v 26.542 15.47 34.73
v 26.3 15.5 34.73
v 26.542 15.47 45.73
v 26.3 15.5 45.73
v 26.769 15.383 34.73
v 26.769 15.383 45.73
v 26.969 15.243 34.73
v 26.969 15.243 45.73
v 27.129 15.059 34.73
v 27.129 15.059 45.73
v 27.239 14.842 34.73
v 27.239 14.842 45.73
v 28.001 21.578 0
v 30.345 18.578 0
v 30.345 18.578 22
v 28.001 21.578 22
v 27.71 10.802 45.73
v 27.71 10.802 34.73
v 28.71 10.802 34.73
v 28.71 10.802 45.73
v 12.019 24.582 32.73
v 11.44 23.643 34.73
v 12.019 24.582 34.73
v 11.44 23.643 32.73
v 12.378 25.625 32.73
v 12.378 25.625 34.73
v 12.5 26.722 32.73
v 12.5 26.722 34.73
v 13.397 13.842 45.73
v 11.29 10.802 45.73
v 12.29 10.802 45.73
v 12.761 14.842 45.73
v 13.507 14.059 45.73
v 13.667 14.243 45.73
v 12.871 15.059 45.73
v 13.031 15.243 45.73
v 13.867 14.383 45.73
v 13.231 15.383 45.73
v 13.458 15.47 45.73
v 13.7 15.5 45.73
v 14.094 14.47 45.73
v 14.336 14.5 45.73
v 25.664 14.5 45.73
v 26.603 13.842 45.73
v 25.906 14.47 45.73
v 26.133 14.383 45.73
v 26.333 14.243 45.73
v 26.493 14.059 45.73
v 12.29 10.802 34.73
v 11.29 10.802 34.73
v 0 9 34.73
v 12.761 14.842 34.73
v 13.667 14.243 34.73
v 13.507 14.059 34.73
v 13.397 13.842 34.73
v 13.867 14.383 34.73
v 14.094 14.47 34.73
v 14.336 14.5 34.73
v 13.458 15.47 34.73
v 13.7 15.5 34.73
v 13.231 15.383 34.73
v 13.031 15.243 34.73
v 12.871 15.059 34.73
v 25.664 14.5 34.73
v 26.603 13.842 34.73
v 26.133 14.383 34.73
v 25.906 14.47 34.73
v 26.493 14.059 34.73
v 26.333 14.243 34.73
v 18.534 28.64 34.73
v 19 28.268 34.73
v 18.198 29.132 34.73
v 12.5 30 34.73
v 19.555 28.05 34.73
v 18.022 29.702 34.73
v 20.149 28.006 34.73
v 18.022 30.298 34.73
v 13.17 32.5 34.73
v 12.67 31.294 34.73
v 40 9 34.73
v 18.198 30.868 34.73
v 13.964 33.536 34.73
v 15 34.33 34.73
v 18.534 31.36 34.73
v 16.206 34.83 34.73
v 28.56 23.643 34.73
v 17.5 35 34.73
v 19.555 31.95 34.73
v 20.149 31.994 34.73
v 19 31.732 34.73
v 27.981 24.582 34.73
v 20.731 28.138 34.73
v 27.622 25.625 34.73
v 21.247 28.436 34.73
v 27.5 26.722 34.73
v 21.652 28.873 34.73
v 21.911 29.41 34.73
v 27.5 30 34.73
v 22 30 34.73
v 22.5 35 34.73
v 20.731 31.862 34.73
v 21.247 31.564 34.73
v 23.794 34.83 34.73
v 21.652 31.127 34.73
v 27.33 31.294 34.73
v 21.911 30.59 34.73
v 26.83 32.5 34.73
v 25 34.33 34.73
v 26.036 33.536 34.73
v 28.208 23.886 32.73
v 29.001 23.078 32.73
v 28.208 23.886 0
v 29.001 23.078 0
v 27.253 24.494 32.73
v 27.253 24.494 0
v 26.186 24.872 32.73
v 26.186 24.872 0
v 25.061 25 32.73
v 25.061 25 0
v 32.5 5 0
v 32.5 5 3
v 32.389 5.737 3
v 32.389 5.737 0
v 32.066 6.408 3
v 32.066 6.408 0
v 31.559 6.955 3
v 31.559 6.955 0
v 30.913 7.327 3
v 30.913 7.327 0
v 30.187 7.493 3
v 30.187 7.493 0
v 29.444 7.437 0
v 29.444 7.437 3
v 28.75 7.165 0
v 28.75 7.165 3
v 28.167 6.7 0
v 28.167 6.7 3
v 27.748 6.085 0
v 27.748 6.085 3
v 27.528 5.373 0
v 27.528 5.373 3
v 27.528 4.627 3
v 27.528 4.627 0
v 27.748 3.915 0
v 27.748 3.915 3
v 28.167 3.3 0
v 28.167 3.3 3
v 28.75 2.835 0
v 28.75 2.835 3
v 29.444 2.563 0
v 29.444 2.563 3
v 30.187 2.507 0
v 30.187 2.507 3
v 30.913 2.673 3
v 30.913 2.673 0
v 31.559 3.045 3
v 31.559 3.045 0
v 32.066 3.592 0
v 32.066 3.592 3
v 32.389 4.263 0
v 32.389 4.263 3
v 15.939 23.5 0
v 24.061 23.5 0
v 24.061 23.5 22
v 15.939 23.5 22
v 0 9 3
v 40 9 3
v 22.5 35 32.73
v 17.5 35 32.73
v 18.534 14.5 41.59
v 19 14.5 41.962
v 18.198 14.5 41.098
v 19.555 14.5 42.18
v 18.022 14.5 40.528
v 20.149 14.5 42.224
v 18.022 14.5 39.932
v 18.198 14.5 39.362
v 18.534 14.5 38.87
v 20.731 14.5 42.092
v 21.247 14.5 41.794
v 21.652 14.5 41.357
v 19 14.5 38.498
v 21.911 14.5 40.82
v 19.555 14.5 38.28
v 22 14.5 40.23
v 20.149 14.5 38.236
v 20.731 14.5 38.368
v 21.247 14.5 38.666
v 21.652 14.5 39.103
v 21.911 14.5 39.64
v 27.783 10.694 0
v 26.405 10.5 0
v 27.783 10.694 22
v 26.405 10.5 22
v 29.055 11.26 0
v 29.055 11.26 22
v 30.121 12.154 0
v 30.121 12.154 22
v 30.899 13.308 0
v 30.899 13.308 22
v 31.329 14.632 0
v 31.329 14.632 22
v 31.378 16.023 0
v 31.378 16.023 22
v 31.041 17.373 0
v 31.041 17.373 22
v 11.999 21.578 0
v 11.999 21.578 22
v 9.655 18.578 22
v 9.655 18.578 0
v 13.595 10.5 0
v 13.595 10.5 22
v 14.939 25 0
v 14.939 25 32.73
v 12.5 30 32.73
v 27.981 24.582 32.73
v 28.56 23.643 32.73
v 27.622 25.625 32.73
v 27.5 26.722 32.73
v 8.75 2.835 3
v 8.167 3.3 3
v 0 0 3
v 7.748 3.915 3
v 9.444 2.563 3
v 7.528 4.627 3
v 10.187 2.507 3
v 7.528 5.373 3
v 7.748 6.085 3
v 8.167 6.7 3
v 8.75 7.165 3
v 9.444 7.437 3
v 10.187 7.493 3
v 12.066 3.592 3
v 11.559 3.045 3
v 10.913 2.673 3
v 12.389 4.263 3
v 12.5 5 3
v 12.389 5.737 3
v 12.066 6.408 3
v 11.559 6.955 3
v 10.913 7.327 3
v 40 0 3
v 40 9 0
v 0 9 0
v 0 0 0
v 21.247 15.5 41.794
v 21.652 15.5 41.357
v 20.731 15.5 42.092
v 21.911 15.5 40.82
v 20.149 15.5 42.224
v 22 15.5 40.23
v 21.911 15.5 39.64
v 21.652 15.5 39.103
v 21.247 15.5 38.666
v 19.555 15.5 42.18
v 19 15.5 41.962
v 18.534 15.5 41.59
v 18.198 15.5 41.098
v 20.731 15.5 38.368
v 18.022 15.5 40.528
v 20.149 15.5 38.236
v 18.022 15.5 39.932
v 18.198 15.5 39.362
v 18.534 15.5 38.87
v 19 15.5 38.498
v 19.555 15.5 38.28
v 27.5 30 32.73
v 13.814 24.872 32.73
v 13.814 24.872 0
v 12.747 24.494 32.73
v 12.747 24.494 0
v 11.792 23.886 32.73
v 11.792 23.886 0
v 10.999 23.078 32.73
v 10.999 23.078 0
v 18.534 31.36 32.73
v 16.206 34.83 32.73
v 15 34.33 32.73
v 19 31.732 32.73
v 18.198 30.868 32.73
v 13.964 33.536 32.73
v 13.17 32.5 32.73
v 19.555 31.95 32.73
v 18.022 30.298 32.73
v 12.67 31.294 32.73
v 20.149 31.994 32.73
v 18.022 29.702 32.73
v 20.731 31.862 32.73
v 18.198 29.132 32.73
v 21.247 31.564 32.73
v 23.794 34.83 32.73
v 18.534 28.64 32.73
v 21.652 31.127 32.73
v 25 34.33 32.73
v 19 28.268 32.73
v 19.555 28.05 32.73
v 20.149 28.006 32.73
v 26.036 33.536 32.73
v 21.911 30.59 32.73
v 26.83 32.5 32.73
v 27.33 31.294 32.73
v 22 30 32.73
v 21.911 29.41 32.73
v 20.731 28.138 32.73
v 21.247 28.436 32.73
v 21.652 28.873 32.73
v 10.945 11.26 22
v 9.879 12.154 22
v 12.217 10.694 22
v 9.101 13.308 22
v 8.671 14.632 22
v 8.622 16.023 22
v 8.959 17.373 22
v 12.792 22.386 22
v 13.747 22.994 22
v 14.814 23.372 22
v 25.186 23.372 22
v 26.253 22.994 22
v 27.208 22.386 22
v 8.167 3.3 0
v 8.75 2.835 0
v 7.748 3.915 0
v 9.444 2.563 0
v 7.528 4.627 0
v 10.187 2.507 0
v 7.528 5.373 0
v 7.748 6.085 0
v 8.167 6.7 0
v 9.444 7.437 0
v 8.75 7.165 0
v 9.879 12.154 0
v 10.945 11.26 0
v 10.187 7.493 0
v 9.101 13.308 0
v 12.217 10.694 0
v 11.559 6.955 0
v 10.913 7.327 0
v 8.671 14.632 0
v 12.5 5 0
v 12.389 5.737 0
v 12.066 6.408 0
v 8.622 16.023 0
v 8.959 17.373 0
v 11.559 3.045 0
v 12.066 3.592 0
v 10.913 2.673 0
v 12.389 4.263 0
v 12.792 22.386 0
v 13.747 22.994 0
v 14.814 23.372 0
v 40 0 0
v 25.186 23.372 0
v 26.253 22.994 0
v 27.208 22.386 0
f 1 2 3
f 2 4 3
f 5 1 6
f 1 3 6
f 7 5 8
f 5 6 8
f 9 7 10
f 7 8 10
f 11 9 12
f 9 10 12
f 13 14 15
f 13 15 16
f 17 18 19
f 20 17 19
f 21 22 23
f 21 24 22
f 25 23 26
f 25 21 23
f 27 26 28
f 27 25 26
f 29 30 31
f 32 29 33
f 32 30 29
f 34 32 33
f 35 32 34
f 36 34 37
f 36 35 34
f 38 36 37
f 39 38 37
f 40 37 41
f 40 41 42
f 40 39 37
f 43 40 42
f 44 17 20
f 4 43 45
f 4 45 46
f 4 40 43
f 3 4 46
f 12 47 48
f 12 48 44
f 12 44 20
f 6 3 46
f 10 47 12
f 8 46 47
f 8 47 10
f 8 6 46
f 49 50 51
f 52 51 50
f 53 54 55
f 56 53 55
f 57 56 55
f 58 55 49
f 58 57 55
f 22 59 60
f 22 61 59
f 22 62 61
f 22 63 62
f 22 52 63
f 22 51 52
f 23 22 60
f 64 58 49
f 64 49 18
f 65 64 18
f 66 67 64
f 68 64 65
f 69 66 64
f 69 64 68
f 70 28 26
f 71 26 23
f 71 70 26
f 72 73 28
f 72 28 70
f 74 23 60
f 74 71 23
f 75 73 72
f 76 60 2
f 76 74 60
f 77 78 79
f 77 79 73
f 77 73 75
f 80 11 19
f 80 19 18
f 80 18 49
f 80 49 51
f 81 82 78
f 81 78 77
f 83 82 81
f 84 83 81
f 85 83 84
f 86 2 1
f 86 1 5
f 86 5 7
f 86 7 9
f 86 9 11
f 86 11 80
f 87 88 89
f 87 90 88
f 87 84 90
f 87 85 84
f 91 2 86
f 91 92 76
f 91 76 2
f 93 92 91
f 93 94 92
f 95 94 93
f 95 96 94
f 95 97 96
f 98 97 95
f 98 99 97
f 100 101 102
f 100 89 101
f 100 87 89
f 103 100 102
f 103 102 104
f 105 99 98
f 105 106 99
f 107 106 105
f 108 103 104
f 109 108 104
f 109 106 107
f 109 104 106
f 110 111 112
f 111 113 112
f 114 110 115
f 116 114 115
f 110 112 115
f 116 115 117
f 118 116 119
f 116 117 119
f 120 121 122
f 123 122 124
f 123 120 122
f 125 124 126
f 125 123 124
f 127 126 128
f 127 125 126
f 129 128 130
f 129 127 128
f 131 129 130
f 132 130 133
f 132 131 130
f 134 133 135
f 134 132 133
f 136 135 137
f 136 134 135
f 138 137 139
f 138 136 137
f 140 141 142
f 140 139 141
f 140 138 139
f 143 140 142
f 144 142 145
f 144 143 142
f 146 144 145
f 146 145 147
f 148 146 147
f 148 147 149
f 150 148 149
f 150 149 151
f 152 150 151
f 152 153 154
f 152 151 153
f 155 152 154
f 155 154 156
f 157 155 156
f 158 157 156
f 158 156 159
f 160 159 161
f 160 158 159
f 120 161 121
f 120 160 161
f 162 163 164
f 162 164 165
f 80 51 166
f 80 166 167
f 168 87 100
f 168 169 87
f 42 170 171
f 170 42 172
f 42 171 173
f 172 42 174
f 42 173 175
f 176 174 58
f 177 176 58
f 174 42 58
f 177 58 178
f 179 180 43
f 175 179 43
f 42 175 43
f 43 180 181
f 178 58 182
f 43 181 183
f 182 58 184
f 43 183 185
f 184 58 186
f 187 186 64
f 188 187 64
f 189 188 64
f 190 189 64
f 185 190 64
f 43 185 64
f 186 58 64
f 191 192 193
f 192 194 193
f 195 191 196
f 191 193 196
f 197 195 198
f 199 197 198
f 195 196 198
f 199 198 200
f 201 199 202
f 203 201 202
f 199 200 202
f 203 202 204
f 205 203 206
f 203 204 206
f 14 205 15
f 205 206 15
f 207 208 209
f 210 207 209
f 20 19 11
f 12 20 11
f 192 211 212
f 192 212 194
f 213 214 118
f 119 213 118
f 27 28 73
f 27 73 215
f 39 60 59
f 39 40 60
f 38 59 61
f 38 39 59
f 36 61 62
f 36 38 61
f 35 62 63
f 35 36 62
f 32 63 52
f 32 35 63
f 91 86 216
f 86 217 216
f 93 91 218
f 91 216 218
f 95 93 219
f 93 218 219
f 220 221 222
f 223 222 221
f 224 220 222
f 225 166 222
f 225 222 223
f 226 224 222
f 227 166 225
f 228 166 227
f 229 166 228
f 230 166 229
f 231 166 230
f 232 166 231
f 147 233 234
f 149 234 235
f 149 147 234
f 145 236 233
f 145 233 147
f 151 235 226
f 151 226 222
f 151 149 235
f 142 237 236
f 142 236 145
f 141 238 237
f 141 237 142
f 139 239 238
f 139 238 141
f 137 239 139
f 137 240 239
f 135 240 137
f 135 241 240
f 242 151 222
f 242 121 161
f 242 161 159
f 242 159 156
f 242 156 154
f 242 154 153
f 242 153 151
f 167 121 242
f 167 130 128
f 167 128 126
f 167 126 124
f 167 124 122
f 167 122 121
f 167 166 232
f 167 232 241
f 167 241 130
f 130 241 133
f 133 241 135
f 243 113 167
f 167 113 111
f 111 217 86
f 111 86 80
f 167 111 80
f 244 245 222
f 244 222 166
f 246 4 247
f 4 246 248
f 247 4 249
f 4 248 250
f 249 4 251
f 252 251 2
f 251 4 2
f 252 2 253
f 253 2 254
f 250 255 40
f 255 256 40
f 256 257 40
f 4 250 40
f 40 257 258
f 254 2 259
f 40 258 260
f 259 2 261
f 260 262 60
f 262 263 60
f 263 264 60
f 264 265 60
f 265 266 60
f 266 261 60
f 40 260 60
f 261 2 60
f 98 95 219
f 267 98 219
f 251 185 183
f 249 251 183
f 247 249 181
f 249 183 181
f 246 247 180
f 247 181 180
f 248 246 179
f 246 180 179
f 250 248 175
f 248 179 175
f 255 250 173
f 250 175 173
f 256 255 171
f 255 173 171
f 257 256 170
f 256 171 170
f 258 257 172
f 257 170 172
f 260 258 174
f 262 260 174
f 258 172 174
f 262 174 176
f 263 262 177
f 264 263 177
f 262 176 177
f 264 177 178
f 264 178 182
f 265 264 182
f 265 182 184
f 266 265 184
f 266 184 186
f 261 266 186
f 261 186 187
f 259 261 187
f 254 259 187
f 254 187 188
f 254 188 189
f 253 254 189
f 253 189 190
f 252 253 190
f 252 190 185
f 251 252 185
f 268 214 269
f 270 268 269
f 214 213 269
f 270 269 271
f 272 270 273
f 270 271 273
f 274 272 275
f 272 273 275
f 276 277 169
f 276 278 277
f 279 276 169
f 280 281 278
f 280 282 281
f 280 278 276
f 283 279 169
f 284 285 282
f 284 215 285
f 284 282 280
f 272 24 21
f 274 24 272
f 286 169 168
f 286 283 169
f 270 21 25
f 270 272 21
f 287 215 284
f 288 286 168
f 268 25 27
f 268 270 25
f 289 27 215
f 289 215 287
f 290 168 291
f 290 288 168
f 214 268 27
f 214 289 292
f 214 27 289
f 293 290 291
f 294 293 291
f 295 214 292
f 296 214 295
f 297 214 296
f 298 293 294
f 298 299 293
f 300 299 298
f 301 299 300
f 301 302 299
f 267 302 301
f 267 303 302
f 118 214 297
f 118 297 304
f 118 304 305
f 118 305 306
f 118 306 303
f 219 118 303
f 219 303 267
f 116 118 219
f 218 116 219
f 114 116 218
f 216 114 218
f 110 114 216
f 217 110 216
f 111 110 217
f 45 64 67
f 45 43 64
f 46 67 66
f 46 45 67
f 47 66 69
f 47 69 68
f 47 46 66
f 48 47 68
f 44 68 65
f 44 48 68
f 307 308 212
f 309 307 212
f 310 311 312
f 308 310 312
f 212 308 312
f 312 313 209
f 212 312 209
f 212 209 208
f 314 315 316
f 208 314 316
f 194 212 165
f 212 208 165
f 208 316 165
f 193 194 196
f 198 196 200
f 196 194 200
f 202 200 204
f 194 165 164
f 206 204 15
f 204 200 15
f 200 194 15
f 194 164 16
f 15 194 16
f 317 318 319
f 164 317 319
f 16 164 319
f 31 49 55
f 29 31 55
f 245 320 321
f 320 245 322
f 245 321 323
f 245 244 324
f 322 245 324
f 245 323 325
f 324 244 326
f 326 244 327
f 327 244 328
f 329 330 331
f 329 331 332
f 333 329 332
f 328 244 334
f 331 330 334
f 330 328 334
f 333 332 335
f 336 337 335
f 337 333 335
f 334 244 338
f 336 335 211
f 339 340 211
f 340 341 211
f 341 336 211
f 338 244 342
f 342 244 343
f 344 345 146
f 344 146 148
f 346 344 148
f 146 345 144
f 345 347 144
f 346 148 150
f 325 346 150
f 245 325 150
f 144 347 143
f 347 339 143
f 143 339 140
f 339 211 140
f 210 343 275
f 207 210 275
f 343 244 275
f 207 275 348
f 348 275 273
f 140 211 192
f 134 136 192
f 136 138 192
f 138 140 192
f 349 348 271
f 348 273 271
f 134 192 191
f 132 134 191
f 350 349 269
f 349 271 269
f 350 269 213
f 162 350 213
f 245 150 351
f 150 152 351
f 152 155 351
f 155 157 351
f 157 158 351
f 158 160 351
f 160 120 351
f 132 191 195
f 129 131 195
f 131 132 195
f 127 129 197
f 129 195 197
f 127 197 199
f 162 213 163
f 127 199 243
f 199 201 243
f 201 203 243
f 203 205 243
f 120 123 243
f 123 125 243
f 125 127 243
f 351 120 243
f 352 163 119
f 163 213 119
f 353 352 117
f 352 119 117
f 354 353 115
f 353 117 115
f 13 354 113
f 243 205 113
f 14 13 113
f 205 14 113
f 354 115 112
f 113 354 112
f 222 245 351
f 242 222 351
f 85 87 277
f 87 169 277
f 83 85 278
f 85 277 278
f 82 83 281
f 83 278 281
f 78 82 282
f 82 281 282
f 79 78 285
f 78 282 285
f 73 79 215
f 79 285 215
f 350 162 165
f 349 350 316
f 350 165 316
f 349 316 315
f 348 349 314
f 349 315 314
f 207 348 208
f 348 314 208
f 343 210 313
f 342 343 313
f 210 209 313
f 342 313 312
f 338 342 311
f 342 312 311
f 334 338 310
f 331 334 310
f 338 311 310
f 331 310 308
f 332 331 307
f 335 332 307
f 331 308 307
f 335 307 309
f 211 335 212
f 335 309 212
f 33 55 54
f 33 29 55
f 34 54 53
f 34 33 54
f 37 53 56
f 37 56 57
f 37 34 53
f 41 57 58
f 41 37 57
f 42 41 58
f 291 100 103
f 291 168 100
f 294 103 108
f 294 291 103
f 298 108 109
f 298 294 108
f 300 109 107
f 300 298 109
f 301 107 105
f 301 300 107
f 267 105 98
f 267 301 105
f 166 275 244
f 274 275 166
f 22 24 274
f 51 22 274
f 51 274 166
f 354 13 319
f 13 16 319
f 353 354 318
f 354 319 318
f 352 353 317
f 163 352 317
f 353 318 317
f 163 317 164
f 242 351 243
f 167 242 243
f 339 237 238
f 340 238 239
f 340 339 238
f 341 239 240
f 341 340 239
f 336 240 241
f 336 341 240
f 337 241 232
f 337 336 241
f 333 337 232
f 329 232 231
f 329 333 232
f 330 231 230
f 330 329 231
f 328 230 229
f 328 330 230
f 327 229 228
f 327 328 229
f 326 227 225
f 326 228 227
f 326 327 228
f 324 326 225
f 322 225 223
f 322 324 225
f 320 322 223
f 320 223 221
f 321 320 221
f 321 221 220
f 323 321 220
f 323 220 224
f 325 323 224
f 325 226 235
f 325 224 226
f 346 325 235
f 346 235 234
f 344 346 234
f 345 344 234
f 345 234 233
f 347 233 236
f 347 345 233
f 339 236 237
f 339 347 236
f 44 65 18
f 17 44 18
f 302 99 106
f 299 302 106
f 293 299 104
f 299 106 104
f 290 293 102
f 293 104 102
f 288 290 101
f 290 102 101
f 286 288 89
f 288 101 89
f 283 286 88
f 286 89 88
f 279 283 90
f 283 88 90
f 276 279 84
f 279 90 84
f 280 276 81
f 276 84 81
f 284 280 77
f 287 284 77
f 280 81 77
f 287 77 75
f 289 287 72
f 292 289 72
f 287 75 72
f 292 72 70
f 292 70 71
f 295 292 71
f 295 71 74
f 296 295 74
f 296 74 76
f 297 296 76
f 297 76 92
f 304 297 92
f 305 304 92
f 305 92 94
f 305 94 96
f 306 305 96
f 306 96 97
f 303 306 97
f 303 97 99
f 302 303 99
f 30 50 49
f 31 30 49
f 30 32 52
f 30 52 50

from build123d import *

# Parameters (mm, degrees)
SKETCH1_W               = 40
SKETCH1_H               = 25
SKETCH1_R               = 2.5
BOSS_EXTRUDE1_DEPTH     = 34.73
BOSS_EXTRUDE2_DEPTH     = 11
FILLET3_R               = 1
SKETCH5_W               = 15
SKETCH5_H               = 2
BOSS_EXTRUDE3_DEPTH     = 10
SKETCH8_R               = 2
CUT_EXTRUDE4_DEPTH      = 12
CUT_EXTRUDE4_DEPTH_BACK = 35.73
SKETCH10_W              = 40
SKETCH10_H              = 9
CUT_EXTRUDE5_DEPTH      = 22
CUT_EXTRUDE7_DEPTH      = 35.73
SKETCH7_R               = 2
CUT_EXTRUDE9_DEPTH      = 22
CUT_EXTRUDE8_DEPTH      = 22
FILLET7_R               = 5
FILLET8_R               = 5
FILLET9_R               = 5
FILLET10_R              = 5
FILLET11_R              = 5
FILLET12_R              = 5
FILLET13_R              = 5
FILLET14_R              = 5
FILLET15_R              = 5
FILLET16_R              = 5
SKETCH15_W              = 40
SKETCH15_H              = 9
CUT_EXTRUDE10_DEPTH     = 9.73


with BuildPart() as part:
    # Sketch1 → Boss-Extrude1 (new body)
    with BuildSketch(Plane.XY):
        with Locations((20, 12.5)):
            Rectangle(SKETCH1_W, SKETCH1_H)
        with Locations((10, 5)):
            Circle(SKETCH1_R, mode=Mode.SUBTRACT)
        with Locations((30, 5)):
            Circle(SKETCH1_R, mode=Mode.SUBTRACT)
    extrude(amount=BOSS_EXTRUDE1_DEPTH)

    # Sketch2 → Boss-Extrude2 (add)
    with BuildSketch(Plane.XY.offset(34.73)):
        Polygon((27, 15.5), (13, 15.5), (11.289899283, 10.801536896), (12.289899283, 10.801536896), (13.636029766, 14.5), (26.363970234, 14.5), (27.710100717, 10.801536896), (28.710100717, 10.801536896), align=None)
    extrude(amount=BOSS_EXTRUDE2_DEPTH)

    # Fillet3
    fillet3_edges = [part.edges().sort_by_distance(p)[0] for p in [
        (13, 15.5, 40.23),
        (13.636029766, 14.5, 40.23),
        (26.363970234, 14.5, 40.23),
        (27, 15.5, 40.23),
    ]]
    fillet(fillet3_edges, radius=FILLET3_R)

    # Sketch5 → Boss-Extrude3 (add)
    with BuildSketch(Plane(origin=(0, 25, 0), x_dir=(1, 0, 0), z_dir=(0, 1, 0))):
        with Locations((20, -33.73)):
            Rectangle(SKETCH5_W, SKETCH5_H)
    extrude(amount=BOSS_EXTRUDE3_DEPTH)

    # Sketch8 → Cut-Extrude4 (cut, two sides)
    with BuildSketch(Plane.XY.offset(34.73)) as cut_extrude4_sk:
        with Locations((20, 30)):
            Circle(SKETCH8_R)
    extrude(amount=CUT_EXTRUDE4_DEPTH, mode=Mode.SUBTRACT)
    extrude(cut_extrude4_sk.sketch, amount=-CUT_EXTRUDE4_DEPTH_BACK, mode=Mode.SUBTRACT)

    # Sketch10 → Cut-Extrude5 (cut)
    with BuildSketch(Plane.XY.offset(34.73)):
        with Locations((20, 4.5)):
            Rectangle(SKETCH10_W, SKETCH10_H)
    extrude(amount=-CUT_EXTRUDE5_DEPTH, mode=Mode.SUBTRACT)

    # Sketch12 → Cut-Extrude7 (cut, through all)
    with BuildSketch(Plane.XY.offset(34.73)):
        Polygon((12.5, 25), (0, 9), (0, 25), align=None)
        Polygon((27.5, 25), (40, 9), (40, 25), align=None)
    extrude(amount=-CUT_EXTRUDE7_DEPTH, mode=Mode.SUBTRACT)

    # Sketch7 → Cut-Extrude9 (cut)
    with BuildSketch(Plane.XZ.offset(-14.5)):
        with Locations((20, 40.23)):
            Circle(SKETCH7_R)
    extrude(amount=-CUT_EXTRUDE9_DEPTH, mode=Mode.SUBTRACT)

    # Sketch14 → Cut-Extrude8 (cut)
    with BuildSketch(Plane(origin=(0, 0, 0), x_dir=(-1, 0, 0), z_dir=(0, 0, -1))):
        Polygon((-36.656713145, 10.5), (-26.5, 23.5), (-13.5, 23.5), (-3.343286855, 10.5), align=None)
    extrude(amount=-CUT_EXTRUDE8_DEPTH, mode=Mode.SUBTRACT)

    # Fillet7
    fillet7_edges = [part.edges().sort_by_distance(p)[0] for p in [
        (27.5, 25, 16.365),
    ]]
    fillet(fillet7_edges, radius=FILLET7_R)

    # Fillet8
    fillet8_edges = [part.edges().sort_by_distance(p)[0] for p in [
        (27.5, 25, 33.73),
    ]]
    fillet(fillet8_edges, radius=FILLET8_R)

    # Fillet9
    fillet9_edges = [part.edges().sort_by_distance(p)[0] for p in [
        (12.5, 25, 16.365),
    ]]
    fillet(fillet9_edges, radius=FILLET9_R)

    # Fillet10
    fillet10_edges = [part.edges().sort_by_distance(p)[0] for p in [
        (12.5, 25, 33.73),
    ]]
    fillet(fillet10_edges, radius=FILLET10_R)

    # Fillet11
    fillet11_edges = [part.edges().sort_by_distance(p)[0] for p in [
        (3.343286855, 10.5, 11),
    ]]
    fillet(fillet11_edges, radius=FILLET11_R)

    # Fillet12
    fillet12_edges = [part.edges().sort_by_distance(p)[0] for p in [
        (36.656713145, 10.5, 11),
    ]]
    fillet(fillet12_edges, radius=FILLET12_R)

    # Fillet13
    fillet13_edges = [part.edges().sort_by_distance(p)[0] for p in [
        (26.5, 23.5, 11),
    ]]
    fillet(fillet13_edges, radius=FILLET13_R)

    # Fillet14
    fillet14_edges = [part.edges().sort_by_distance(p)[0] for p in [
        (13.5, 23.5, 11),
    ]]
    fillet(fillet14_edges, radius=FILLET14_R)

    # Fillet15
    fillet15_edges = [part.edges().sort_by_distance(p)[0] for p in [
        (27.5, 35, 33.73),
    ]]
    fillet(fillet15_edges, radius=FILLET15_R)

    # Fillet16
    fillet16_edges = [part.edges().sort_by_distance(p)[0] for p in [
        (12.5, 35, 33.73),
    ]]
    fillet(fillet16_edges, radius=FILLET16_R)

    # Sketch15 → Cut-Extrude10 (cut)
    with BuildSketch(Plane.XY.offset(12.73)):
        with Locations((20, 4.5)):
            Rectangle(SKETCH15_W, SKETCH15_H)
    extrude(amount=-CUT_EXTRUDE10_DEPTH, mode=Mode.SUBTRACT)


solid = part.part
